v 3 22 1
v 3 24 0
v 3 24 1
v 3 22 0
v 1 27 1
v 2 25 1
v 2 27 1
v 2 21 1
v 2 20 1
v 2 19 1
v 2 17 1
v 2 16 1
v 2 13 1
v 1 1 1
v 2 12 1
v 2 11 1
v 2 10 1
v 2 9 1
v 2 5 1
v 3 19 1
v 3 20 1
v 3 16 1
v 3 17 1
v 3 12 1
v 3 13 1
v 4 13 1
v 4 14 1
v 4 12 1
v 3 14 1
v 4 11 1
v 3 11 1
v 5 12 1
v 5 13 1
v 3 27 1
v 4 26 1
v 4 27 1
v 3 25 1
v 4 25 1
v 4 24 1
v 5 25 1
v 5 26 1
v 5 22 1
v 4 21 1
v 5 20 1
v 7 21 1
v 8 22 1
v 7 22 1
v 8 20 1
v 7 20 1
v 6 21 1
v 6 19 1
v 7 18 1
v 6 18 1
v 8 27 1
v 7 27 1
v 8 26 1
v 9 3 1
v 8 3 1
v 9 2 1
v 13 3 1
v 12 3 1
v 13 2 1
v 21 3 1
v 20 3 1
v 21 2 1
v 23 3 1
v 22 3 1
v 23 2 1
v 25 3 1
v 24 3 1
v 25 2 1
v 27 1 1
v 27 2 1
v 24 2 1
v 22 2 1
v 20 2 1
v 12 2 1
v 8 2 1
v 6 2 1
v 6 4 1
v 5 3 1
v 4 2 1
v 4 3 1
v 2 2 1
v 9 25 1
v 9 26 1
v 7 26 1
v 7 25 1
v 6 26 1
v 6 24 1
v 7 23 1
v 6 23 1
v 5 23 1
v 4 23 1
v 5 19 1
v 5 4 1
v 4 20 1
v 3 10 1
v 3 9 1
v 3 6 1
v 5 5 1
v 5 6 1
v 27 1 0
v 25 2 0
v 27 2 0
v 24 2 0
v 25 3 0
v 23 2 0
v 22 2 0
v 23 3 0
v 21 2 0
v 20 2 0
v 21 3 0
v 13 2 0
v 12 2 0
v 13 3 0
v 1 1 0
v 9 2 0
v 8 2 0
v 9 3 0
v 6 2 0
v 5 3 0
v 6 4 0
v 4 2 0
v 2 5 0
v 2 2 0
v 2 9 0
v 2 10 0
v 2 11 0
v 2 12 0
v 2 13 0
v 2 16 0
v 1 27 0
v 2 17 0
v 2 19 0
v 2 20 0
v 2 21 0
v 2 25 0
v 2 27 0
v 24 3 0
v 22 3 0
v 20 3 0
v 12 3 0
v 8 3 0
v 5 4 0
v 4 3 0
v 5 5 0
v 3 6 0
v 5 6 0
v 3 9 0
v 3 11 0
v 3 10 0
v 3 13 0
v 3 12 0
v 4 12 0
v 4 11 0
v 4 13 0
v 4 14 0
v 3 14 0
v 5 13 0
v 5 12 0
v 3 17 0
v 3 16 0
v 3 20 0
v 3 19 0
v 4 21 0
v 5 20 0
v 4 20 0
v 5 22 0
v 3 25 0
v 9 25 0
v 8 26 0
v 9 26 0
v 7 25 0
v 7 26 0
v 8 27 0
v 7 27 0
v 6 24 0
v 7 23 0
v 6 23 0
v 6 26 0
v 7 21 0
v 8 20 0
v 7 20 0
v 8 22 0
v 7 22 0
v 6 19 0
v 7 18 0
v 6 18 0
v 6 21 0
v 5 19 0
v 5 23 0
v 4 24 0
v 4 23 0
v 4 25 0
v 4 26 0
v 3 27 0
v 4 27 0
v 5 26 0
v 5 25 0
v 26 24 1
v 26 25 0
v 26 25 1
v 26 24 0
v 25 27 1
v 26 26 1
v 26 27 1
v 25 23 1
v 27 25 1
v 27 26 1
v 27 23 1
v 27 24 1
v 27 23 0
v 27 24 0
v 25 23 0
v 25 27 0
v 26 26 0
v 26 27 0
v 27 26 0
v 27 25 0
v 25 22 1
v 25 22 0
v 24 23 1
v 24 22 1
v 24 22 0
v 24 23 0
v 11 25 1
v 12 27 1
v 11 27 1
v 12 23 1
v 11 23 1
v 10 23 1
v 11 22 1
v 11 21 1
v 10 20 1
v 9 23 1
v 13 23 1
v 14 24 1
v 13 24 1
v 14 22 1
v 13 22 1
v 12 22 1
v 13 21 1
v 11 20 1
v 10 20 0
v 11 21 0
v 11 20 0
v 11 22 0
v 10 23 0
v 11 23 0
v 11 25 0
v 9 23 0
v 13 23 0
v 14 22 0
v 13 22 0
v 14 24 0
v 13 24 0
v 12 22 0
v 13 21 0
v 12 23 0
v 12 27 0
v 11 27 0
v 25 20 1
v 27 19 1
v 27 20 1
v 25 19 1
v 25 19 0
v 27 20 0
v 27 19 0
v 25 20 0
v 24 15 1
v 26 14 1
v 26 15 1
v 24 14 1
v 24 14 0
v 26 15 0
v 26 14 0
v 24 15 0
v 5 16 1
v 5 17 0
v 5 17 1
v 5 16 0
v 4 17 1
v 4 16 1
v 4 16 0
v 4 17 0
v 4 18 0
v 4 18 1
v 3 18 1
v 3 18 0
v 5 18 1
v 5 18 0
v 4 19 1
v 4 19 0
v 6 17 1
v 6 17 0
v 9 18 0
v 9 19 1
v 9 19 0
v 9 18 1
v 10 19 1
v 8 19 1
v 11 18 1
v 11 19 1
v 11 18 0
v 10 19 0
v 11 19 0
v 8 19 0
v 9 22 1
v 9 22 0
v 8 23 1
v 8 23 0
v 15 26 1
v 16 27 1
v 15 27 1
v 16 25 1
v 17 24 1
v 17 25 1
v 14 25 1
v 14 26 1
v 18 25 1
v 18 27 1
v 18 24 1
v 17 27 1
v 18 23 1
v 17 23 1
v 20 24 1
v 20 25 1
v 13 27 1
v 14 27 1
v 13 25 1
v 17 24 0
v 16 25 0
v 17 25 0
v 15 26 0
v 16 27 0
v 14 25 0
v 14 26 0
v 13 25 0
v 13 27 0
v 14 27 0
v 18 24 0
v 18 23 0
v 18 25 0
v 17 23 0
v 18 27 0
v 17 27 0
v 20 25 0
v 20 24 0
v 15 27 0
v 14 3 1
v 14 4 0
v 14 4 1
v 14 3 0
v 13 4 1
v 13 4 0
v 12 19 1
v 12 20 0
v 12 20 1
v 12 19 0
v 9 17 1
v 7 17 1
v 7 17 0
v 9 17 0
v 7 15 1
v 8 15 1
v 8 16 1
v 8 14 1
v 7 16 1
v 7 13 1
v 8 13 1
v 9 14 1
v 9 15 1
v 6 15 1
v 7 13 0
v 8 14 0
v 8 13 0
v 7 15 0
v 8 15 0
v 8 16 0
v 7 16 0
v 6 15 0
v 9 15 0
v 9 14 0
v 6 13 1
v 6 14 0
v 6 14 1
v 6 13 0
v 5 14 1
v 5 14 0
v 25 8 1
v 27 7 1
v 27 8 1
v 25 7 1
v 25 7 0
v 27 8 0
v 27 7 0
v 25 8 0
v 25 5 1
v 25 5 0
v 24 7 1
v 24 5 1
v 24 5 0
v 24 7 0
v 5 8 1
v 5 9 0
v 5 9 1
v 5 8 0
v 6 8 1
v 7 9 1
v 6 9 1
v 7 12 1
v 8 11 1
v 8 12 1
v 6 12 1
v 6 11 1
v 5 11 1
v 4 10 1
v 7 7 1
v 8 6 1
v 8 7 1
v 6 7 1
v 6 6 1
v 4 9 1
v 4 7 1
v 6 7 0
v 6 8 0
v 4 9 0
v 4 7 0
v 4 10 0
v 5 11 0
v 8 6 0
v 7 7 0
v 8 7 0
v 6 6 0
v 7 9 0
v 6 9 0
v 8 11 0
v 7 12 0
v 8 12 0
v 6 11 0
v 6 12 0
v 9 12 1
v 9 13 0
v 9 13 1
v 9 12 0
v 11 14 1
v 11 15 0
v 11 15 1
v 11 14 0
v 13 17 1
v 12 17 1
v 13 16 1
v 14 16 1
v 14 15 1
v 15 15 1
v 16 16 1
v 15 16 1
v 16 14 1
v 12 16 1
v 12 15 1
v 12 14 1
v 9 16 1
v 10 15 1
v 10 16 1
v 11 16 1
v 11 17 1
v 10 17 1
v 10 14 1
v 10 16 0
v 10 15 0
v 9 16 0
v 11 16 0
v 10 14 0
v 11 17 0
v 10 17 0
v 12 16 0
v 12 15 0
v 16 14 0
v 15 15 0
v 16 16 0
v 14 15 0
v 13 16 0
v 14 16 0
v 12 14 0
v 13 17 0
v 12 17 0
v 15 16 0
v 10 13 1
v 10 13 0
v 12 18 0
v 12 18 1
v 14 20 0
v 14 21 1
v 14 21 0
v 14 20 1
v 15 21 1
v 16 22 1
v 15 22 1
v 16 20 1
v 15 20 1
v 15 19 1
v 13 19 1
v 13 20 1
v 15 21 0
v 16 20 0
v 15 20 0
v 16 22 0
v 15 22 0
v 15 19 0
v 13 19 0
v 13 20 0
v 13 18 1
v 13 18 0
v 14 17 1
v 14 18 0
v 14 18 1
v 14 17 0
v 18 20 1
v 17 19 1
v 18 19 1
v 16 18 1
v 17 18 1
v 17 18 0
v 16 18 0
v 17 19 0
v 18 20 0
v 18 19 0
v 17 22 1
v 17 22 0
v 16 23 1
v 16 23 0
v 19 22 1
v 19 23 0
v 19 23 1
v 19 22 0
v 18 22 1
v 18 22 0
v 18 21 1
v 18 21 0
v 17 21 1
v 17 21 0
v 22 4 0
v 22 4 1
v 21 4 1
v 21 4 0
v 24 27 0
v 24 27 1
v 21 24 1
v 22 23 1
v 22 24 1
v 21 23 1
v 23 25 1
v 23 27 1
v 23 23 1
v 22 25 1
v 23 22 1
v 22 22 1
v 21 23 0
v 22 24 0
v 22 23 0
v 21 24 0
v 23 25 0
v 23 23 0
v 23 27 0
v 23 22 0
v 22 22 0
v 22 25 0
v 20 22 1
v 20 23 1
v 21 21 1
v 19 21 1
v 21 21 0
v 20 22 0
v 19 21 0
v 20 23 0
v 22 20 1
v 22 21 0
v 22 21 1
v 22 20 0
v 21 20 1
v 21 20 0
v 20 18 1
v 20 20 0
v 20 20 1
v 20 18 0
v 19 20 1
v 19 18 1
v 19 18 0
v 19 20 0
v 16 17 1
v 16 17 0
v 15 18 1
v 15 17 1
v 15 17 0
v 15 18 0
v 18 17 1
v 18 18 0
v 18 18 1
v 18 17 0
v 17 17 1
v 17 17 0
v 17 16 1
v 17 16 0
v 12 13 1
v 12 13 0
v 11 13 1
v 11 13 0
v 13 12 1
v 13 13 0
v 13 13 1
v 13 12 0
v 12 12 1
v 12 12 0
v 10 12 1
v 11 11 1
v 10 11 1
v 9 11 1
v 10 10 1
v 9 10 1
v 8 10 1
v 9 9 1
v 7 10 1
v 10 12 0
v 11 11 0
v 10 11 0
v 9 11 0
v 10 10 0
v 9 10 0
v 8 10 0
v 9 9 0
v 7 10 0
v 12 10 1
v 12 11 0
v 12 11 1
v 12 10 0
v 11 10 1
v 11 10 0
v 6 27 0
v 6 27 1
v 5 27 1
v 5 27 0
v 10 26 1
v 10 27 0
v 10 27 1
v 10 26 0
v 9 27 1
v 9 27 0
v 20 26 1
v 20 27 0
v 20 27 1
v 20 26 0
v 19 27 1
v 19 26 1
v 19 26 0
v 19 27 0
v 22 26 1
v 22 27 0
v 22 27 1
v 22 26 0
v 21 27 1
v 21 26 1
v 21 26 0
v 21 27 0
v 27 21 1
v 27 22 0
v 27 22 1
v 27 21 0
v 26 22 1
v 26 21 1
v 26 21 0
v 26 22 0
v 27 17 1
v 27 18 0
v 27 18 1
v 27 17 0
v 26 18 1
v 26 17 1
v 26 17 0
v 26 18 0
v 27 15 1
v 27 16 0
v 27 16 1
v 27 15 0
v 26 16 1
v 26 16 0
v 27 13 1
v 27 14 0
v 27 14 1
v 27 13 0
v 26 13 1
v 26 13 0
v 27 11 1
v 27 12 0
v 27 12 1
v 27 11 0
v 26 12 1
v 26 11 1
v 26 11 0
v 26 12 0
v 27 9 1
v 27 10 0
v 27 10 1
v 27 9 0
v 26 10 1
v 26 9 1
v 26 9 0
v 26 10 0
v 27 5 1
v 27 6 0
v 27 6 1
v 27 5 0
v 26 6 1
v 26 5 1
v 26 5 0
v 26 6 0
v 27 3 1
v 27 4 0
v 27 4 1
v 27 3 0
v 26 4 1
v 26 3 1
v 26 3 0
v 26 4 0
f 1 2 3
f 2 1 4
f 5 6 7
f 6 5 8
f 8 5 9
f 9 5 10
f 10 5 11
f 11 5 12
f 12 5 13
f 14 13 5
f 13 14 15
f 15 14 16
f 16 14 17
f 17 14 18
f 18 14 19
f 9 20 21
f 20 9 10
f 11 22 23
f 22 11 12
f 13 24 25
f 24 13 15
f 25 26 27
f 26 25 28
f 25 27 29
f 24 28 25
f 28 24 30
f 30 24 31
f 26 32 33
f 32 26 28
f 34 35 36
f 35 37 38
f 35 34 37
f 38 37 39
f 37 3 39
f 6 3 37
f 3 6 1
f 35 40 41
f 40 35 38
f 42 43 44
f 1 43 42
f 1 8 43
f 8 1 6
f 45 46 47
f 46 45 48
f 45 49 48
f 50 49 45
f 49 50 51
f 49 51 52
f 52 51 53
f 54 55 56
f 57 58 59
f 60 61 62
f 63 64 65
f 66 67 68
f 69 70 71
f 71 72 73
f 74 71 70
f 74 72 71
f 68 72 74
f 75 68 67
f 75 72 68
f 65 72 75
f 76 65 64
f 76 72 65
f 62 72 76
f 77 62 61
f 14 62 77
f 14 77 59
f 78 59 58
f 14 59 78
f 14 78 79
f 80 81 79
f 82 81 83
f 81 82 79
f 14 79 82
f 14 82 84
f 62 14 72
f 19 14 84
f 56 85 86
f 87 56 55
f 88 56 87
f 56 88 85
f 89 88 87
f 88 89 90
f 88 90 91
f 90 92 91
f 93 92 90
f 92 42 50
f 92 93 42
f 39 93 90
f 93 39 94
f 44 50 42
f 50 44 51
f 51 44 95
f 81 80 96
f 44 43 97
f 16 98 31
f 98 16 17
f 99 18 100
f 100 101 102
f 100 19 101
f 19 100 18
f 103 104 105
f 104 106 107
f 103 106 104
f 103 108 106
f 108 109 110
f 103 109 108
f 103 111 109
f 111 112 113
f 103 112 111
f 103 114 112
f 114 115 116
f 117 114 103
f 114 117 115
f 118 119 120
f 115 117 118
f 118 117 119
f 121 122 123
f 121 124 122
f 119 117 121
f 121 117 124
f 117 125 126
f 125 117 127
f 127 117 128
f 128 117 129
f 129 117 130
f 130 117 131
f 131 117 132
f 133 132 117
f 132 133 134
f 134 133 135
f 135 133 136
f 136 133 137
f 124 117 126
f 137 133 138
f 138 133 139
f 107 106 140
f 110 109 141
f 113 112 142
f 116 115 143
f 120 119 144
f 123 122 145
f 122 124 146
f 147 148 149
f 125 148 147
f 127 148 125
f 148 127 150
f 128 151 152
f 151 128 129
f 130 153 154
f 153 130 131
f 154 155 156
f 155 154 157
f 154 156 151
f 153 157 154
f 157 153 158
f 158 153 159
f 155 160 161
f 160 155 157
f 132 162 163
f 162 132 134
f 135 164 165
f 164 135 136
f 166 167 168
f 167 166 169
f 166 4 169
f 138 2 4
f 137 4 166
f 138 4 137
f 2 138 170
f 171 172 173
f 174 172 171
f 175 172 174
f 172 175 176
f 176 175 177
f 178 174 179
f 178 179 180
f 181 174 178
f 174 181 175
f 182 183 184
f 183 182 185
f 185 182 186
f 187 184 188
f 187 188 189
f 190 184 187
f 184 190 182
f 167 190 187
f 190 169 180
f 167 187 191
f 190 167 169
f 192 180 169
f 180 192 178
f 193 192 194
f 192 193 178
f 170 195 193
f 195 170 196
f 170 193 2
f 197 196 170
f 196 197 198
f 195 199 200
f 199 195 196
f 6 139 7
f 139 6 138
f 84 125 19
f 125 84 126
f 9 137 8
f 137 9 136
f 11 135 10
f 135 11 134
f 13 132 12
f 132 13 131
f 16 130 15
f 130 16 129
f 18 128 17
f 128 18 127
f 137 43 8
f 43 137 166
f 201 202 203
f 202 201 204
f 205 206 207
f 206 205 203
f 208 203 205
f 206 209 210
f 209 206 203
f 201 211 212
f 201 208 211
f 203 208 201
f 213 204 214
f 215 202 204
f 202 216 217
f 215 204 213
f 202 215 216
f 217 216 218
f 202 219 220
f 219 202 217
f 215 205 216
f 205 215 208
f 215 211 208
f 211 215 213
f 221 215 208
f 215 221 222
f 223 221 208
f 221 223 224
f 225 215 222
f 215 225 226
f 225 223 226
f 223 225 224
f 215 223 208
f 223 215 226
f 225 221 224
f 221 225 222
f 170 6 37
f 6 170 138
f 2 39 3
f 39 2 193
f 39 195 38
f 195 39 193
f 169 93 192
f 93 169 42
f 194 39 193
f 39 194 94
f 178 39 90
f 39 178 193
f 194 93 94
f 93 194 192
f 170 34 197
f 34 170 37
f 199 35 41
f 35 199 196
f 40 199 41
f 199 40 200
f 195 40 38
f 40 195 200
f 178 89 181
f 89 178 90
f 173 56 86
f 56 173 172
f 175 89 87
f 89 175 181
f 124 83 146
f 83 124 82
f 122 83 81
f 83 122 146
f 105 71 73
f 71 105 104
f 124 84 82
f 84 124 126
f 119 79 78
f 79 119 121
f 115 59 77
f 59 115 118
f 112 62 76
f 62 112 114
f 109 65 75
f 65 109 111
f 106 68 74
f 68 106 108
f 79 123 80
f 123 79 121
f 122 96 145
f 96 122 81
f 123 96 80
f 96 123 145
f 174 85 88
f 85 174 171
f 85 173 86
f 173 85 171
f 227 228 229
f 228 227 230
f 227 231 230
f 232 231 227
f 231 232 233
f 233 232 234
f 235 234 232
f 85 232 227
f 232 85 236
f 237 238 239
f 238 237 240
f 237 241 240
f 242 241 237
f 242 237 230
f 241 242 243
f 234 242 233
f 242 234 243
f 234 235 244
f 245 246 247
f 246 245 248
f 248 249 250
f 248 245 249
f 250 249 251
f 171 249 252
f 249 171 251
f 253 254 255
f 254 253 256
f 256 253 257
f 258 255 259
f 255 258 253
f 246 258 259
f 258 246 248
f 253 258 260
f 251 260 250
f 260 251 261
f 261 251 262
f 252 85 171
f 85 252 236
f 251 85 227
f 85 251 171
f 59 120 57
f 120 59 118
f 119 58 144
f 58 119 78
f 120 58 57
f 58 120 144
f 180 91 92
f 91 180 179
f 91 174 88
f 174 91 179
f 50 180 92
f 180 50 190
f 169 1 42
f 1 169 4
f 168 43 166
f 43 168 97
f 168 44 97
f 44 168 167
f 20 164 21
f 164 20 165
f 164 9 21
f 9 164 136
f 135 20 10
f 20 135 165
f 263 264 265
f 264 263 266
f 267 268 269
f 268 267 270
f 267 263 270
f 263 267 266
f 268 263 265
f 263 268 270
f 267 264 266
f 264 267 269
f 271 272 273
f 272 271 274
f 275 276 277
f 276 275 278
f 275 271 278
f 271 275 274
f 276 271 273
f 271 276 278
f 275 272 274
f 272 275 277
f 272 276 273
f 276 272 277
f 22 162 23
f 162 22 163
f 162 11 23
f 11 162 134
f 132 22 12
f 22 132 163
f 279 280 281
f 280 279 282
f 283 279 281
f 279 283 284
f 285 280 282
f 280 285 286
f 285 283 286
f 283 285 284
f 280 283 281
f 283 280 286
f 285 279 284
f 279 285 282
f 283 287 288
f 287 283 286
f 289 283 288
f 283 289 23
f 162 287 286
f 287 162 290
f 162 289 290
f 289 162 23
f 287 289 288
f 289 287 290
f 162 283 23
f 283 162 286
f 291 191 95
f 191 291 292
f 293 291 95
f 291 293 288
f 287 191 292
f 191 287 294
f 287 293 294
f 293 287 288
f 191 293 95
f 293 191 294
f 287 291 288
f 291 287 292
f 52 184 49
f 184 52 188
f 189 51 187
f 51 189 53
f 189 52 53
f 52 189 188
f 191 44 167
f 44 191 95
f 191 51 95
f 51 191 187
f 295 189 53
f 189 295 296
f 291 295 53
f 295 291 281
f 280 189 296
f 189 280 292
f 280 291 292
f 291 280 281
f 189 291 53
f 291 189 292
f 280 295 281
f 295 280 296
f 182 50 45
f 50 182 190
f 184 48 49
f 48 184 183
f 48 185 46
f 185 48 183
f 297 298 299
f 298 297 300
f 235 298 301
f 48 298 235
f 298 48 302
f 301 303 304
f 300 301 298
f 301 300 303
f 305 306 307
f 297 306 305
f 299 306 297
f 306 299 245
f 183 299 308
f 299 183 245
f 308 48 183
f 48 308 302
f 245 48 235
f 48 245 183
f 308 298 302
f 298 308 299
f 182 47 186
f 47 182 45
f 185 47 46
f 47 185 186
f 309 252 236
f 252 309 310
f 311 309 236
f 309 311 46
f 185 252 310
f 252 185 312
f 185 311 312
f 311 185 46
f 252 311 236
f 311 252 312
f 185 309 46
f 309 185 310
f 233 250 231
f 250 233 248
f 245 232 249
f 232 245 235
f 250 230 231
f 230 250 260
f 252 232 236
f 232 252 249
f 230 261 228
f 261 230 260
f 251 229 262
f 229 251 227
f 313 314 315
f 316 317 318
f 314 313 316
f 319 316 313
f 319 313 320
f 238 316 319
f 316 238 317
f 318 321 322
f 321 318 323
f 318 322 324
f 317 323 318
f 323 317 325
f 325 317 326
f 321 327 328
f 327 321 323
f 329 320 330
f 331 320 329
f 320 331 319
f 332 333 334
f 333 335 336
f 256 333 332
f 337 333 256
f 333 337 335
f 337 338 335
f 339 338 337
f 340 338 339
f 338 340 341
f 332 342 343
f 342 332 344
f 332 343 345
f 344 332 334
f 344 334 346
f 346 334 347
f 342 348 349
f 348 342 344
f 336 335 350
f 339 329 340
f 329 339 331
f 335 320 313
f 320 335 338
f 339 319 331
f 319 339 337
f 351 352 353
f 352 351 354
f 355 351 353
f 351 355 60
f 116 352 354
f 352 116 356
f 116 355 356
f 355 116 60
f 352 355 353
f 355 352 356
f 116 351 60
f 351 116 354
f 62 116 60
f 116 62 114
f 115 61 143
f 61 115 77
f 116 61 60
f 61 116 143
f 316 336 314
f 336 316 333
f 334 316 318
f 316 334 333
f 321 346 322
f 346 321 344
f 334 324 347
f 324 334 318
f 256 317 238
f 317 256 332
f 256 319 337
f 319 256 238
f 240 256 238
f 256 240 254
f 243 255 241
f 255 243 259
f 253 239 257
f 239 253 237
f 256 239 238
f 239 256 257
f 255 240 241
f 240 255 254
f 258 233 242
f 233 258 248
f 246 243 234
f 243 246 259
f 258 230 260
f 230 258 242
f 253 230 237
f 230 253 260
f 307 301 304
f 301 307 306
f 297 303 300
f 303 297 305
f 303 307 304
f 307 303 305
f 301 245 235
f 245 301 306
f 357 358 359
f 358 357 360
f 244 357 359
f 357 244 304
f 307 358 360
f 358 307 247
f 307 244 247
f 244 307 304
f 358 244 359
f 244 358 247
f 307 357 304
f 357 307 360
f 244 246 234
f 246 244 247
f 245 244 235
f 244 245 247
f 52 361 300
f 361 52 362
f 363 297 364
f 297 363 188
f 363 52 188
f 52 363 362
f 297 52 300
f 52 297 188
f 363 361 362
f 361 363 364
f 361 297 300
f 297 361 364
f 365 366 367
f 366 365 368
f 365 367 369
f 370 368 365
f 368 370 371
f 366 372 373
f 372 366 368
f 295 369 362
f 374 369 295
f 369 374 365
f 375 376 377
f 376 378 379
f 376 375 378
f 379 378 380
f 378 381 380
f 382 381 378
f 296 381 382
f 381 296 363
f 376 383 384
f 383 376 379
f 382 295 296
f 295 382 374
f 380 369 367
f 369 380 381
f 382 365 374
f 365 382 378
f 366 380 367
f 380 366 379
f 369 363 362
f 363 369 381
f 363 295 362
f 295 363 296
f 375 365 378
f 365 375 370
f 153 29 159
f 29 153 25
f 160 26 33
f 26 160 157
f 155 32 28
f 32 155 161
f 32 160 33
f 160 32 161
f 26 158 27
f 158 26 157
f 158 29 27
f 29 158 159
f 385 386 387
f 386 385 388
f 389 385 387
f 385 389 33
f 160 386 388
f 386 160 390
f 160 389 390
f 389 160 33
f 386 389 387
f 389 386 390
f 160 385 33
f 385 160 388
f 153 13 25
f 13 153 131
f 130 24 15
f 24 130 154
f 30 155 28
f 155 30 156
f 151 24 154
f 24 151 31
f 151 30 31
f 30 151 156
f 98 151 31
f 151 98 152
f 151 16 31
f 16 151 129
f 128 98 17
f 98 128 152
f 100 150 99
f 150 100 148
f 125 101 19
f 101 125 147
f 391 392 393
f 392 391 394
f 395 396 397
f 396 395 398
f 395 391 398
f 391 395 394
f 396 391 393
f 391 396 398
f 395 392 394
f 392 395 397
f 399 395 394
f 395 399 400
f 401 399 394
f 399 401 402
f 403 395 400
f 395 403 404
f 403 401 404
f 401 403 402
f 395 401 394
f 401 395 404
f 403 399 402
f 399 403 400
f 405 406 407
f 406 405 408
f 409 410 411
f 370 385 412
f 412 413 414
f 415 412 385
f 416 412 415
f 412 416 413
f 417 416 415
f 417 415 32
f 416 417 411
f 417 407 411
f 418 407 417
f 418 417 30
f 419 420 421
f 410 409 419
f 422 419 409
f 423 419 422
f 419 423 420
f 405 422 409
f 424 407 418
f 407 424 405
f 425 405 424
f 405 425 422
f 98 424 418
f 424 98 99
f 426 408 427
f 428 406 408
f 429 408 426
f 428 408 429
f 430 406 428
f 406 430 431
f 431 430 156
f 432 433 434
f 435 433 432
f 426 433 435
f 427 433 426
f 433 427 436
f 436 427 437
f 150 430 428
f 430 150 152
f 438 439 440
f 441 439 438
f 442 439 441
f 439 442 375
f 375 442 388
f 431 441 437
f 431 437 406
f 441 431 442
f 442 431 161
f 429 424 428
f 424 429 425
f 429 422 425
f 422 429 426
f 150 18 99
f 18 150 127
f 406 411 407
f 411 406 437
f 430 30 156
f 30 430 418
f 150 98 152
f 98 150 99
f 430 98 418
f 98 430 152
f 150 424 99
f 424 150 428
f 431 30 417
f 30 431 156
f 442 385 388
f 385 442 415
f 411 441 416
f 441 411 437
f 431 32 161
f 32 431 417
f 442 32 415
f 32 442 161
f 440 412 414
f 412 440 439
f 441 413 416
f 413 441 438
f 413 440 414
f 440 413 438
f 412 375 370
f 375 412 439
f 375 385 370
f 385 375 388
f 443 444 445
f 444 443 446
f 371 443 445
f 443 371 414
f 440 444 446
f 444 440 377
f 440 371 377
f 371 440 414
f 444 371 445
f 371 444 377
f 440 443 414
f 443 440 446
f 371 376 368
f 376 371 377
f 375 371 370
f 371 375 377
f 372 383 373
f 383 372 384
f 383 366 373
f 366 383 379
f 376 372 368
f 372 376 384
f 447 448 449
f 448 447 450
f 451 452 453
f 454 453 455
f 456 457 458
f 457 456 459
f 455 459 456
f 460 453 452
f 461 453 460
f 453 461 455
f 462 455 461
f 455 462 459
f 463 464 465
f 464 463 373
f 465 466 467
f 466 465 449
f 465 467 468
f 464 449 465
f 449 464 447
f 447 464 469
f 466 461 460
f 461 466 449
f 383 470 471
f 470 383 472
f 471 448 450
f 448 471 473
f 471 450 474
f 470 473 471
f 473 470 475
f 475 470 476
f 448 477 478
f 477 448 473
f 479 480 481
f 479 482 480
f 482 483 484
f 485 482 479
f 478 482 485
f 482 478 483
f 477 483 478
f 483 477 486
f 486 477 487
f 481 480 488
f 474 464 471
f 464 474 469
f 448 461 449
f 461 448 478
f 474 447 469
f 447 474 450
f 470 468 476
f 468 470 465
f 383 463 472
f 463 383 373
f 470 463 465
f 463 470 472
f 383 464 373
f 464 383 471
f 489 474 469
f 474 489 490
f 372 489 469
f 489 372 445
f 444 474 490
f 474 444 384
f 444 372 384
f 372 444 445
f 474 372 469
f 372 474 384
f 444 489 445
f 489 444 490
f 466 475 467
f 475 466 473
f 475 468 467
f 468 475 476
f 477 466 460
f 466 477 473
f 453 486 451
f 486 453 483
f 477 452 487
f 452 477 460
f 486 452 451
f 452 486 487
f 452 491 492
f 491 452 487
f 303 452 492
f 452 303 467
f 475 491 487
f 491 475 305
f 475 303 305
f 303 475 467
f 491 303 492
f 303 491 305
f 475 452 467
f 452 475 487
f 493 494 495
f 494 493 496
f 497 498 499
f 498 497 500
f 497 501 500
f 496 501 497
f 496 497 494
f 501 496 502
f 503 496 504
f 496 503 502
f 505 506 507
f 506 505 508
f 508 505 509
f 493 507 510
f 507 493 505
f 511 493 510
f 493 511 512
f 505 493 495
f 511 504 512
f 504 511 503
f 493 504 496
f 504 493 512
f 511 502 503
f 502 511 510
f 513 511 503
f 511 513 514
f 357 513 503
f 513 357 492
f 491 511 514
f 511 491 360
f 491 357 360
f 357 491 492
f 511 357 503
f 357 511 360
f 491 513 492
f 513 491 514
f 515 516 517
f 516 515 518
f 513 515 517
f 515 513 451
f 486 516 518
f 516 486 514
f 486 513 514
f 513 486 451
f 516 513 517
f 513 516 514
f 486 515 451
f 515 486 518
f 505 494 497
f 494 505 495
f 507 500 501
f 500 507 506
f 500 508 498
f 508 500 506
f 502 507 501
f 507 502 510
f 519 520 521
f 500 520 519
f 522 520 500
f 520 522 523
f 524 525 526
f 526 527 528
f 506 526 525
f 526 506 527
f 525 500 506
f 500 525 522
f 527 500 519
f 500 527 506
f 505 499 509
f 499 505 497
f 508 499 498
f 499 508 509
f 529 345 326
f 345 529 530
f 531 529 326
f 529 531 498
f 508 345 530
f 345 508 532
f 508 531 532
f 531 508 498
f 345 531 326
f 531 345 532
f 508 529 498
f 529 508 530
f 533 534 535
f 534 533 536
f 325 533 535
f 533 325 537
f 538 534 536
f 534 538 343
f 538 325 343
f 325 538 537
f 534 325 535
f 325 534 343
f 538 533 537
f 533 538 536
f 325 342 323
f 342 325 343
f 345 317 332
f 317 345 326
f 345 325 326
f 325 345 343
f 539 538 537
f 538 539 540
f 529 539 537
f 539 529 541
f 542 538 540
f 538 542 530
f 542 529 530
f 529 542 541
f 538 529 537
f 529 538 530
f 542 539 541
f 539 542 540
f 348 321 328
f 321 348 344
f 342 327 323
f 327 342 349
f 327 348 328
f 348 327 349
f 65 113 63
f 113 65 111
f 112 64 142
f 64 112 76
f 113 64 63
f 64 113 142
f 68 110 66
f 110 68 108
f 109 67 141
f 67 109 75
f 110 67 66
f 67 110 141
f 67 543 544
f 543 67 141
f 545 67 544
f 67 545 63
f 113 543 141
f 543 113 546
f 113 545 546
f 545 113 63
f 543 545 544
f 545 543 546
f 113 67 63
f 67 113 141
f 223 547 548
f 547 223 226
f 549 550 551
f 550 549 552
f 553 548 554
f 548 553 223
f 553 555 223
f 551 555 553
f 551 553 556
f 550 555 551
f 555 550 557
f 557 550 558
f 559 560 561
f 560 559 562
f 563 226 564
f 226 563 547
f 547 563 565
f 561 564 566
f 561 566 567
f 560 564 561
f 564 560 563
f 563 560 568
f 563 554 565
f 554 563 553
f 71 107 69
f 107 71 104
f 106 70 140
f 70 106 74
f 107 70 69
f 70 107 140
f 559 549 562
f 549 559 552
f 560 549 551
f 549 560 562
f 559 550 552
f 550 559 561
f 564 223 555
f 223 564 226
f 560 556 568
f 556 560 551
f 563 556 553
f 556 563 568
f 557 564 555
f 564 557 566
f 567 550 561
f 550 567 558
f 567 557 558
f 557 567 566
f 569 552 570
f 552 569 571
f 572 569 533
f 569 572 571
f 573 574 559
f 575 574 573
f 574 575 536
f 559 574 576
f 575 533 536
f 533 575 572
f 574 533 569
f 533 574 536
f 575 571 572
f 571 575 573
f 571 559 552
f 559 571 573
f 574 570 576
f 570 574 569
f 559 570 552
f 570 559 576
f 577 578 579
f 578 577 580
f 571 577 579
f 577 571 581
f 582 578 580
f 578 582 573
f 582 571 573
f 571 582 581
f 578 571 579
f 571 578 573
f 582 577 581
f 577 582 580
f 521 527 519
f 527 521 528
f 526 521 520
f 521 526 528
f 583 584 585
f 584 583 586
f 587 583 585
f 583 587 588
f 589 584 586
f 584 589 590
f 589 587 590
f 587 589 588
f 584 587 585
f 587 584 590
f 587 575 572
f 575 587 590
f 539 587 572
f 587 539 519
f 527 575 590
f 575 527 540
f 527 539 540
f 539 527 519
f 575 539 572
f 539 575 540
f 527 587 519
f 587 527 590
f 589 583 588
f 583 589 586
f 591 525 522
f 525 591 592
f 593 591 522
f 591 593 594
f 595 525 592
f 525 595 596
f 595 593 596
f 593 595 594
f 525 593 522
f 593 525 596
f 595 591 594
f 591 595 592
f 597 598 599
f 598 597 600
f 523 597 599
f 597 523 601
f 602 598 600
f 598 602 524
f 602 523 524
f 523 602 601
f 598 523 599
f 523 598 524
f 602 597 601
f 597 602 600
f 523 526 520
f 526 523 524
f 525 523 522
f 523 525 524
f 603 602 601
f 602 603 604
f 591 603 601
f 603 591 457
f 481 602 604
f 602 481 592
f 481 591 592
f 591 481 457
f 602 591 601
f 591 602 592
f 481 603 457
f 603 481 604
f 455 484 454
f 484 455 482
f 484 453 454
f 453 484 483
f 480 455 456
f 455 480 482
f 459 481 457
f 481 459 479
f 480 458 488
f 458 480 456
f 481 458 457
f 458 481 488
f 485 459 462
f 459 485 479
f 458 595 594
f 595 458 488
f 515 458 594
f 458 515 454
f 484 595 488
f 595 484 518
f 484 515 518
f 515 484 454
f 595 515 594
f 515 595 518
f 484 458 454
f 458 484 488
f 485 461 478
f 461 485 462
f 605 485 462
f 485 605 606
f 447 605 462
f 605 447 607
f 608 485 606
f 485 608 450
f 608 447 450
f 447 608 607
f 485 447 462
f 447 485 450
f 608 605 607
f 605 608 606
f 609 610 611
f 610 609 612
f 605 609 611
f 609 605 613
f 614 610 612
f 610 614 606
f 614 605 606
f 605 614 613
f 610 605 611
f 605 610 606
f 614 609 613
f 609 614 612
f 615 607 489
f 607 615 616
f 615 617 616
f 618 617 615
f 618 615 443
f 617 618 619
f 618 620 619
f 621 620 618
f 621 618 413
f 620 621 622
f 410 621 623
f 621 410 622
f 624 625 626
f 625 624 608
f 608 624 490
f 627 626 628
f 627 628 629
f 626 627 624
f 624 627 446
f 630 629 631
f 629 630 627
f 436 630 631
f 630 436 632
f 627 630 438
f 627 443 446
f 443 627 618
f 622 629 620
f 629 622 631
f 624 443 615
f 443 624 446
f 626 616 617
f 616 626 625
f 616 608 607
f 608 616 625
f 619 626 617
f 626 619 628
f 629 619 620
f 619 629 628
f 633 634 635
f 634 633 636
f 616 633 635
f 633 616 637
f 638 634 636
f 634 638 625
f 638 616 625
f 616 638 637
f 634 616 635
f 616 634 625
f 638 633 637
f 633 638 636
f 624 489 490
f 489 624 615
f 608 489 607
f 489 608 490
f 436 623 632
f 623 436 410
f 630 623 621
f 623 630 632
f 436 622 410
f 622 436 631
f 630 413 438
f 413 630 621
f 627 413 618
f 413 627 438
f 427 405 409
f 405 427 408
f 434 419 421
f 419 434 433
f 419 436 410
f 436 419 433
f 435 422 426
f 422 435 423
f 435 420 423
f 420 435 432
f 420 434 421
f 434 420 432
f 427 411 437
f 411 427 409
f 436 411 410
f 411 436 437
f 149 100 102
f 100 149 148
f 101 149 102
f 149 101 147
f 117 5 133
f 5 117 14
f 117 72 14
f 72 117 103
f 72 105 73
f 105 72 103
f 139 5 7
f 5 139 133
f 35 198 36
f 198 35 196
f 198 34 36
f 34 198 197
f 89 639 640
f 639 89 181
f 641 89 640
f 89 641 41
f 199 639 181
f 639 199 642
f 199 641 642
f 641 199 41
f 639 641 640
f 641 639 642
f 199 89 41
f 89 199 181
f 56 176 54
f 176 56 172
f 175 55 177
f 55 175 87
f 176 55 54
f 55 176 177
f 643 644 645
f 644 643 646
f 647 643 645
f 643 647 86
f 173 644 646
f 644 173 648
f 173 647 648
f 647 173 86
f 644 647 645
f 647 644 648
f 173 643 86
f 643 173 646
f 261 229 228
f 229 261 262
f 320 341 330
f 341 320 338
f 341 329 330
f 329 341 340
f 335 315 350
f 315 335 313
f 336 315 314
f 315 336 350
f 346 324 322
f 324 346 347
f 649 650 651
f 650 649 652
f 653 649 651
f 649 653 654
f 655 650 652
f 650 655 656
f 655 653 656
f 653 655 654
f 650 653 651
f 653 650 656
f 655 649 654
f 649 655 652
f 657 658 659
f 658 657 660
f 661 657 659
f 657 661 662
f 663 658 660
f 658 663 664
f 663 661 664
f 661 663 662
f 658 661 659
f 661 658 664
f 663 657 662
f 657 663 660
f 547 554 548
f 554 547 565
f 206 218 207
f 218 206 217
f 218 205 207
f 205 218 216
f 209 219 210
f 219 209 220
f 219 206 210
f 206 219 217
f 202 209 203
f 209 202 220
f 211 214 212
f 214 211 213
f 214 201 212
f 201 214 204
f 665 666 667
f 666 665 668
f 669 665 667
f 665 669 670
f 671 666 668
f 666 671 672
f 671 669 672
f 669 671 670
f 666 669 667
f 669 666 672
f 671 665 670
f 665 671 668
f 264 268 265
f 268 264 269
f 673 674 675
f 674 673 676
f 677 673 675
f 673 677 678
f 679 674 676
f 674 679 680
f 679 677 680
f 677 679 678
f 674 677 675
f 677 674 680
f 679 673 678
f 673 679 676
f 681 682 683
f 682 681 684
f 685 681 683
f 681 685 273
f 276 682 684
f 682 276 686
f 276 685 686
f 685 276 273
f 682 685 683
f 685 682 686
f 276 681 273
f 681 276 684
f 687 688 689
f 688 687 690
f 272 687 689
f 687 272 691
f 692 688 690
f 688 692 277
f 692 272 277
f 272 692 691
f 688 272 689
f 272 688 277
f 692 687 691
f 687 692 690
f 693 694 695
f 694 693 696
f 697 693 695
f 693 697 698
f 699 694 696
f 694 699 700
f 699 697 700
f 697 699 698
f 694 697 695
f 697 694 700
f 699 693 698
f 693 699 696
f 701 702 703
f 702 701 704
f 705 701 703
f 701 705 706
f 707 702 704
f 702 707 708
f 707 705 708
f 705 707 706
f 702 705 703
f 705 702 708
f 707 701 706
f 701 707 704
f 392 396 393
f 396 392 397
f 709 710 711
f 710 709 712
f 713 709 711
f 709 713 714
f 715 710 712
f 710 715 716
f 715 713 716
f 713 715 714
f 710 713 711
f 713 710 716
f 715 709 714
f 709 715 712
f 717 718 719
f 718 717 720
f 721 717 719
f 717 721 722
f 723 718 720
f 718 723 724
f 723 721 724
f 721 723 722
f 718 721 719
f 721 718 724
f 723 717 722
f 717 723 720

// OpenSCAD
// file: util/bitmap.scad
/*****************************************************************************
 * Module Bitmap Library
 * Modules to create bitmaps of unit squares from 1 or 2 dimensional vectors.
 *****************************************************************************
 * Copyright 2017 Chris Baker
 *
 * This program is free software: you can redistribute it and/or modify
 * it under the terms of the GNU Lesser General Public License as published by
 * the Free Software Foundation, either version 3 of the License, or
 * (at your option) any later version.
 *
 * This program is distributed in the hope that it will be useful,
 * but WITHOUT ANY WARRANTY; without even the implied warranty of
 * MERCHANTABILITY or FITNESS FOR A PARTICULAR PURPOSE.  See the
 * GNU Lesser General Public License for more details.
 *
 * You should have received a copy of the GNU Lesser General Public License
 * along with this program.  If not, see <http://www.gnu.org/licenses/>.
 *****************************************************************************
 * Usage:
 * Include this file with the "use" tag.
 * Depends on compat.scad library.
 *
 * API:
 *   1dbitmap(bitmap, center, expansion, vector_mode)
 *   2dbitmap(bitmap, center, expansion, vector_mode)
 *     Generate a 1 or 2-Dimensional field of modules based on the provided
 *     bitmap vector. See Bitmap Vectors below.
 *     The center flag determines whether to center the bitmap on the origin.
 *     The expansion value actually shrinks each cube in the x and y
 *     dimension by the specified amount.
 *     The vector_mode flag determines whether to create 3D solid geometry
 *     (unit cubes) or 2D vector geometry (squares).
 *
 * Bitmap Vectors:
 *   The bitmap vectors primarily provide boolean information.
 *   A module will be placed where these vectors have a postive value and
 *   skipped where they have a negative value. I.E. 0, -1, false, and undef
 *   are all equivalent and result in a skip. 1 and true are equivalent and
 *   result in a placed 1-unit module.
 *   Further, if the value is an integer it will be treated as a height for
 *   the module, allowing z-maps to be created.
 *   If the value is not an integer or boolean, it will be treated as a color
 *   reference. This can be a string or RGBA vector that will be used to
 *   color the module in the OpenSCAD preview window.
 *   In current versions of OpenSCAD, the color has no effect in the rendered
 *   view or STL output.
 *
 * Vector Mode:
 *   Although OpenSCAD supports generating 2D geometry, there are several
 *   caveats:
 *   - 2D and 3D geometry cannot be mixed
 *   - Extruding 2D geometry causes color information to be lost
 *   - All 2D geometry is projected onto the XY plane when rendering
 *   - Rendering also results in loss of color (same as 3D)
 *   - The SVG exporter is somewhat limited:
 *     - The pixel size of the image is hard-coded in the file
 *     - The title of the image is a generic string
 *     - The color selection for stroke and fill is fixed
 *     - The stroke-width is set to a large value that will cause overlap
 *     - The background is transparent
 *     - Only one path element is created with all of the geometry; there is
 *       no easy way to split up the geometry into multiple logical units.
 *     - These issues can mostly be resolved by hand-editing the file:
 *       - Remove or modify the width and height parameters from the svg
 *         element at the top of the file to provide better scaling.
 *       - Edit the title element at the top of the file to change the title.
 *       - Edit the stroke and fill parameters of the path element (these will
 *         probably be at the end of the file).
 *       - Set the stroke-width parameter for the path element to 0.
 *****************************************************************************/
use <compat.scad>

/*
 * 2dbitmap - Turn a 2D vector into a bitmap of cubes
 *
 * bitmap - 2D vector representing where to place each cube
 *          Value can either be boolean, z-height, or color
 * center - center cubes around the origin
 * expansion - size of gap around each pixel (screendoor)
 * vector_mode - create a 2D vector drawing instead of 3D extrusion
 */
module 2dbitmap(bitmap=[[1,0],[0,1]], center=false, expansion=0, vector_mode=false)
{
	ylen=len(bitmap)-1;

	for (y=[0:ylen]) {
		xlen=len(bitmap[y])-1;
		for (x=[0:xlen])
			translate([x-(center?xlen/2:0),ylen-y-(center?ylen/2:0),0])
				if (is_indexable(bitmap[y][x]))
					color(bitmap[y][x])
						if (vector_mode)
							square([1-expansion,1-expansion], center=center);
						else
							cube([1-expansion,1-expansion,1], center=center);
				else
					if (bitmap[y][x])
						if (vector_mode)
							square([1-expansion,1-expansion], center=center);
						else
							cube([1-expansion,1-expansion,clamp_nonnum(bitmap[y][x])], center=center);
	}
}

module 1dbitmap(bitmap=[1,0,1,0,1], center=false, expansion=0, vector_mode=false)
	2dbitmap([bitmap], center, expansion, vector_mode);

/*
 * Examples
 */

// 1D with z-height
translate([10,0,0]) scale([1,10,1])
	1dbitmap(bitmap=[1,1,0,2,0,0,3], expansion=.1);

// 1D with boolean
translate([-20,0,0]) scale([1,10,1])
	1dbitmap(bitmap=[true,false,true,false,true,true]);

// 2D with z-height
scale([2,2,1])
	2dbitmap(bitmap=[[1,0,2,1],[0,3,3,0],[1,1,0,1]],
		center=true);

// 1D with color
translate([0,-10,0]) scale([1,3,1])
	1dbitmap(bitmap=["red","white","blue",[0,0.3,0,0.5]]);

// 1D with color using 2D-vector-mode
translate([-7,-8,0]) scale([1,2])
	1dbitmap(bitmap=["red",0,"blue",0,"green"], vector_mode=true);
translate([-4.5,-10,0]) scale([1,2])
	1dbitmap(bitmap=["red",0,"blue",0,"green"], vector_mode=true, center=true);
// file: util/bitlib.scad
/*****************************************************************************
 * Bit Manipulation Library
 * Provides some useful bit manipulation functions.
 *****************************************************************************
 * Copyright 2017 Chris Baker
 *
 * This program is free software: you can redistribute it and/or modify
 * it under the terms of the GNU Lesser General Public License as published by
 * the Free Software Foundation, either version 3 of the License, or
 * (at your option) any later version.
 *
 * This program is distributed in the hope that it will be useful,
 * but WITHOUT ANY WARRANTY; without even the implied warranty of
 * MERCHANTABILITY or FITNESS FOR A PARTICULAR PURPOSE.  See the
 * GNU Lesser General Public License for more details.
 *
 * You should have received a copy of the GNU Lesser General Public License
 * along with this program.  If not, see <http://www.gnu.org/licenses/>.
 *****************************************************************************
 * Usage:
 * Include this file with the "use" tag.
 * When run on its own, all echo statements in this
 * library should print "true".
 *
 * API:
 *   bit(v,b)
 *     Return the truth value of the b'th bit of v.
 *
 *   check_bit_size(v,b,signed=false)
 *     Determine whether the value v can be represented
 *     with b bits (b must be positive).
 *     The signed flag indicates whether to include the
 *     sign bit in the determination; otherwise negative
 *     values will result in undef being returned.
 *
 *   xor(a,b)
 *     Return the value of a xor b.
 *     Handles arbitrary size values for a and b.
 *     Handles negative values as expected (a positive
 *     result will be returned unless a and b have
 *     differing signs).
 *
 * TODO:
 *  - Change echos to asserts (future OpenSCAD version)
 *  - Add more functions
 *
 *****************************************************************************/

//Return the truth value of the b'th bit of v
function bit(v,b) =
	((v==undef)||(b==undef)||(b<0))?undef:
	(floor(v / pow(2, b)) % 2)?true:false;

echo("*** bit() testcases ***");
echo(0,bit(0,0)==false);
echo(1,bit(-1,0)==true);
echo(2,bit(1,0)==true);
echo(3,[for (i=[0:63]) bit(0,i)]==[for (i=[0:63]) false]); //0=0...0
echo(4,[for (i=[0:63]) bit(-1,i)]==[for (i=[0:63]) true]); //-1=1...1
echo(5,[for (i=[1:63]) bit(1,i)]==[for (i=[1:63]) false]); //1=0...01
echo(6,[for (i=[0:7]) bit(85,i)?1:0]==[1,0,1,0,1,0,1,0]); //85=01010101
echo(7,[for (i=[0:7]) bit(170,i)?1:0]==[0,1,0,1,0,1,0,1]); //170=10101010
echo(8,[for (i=[0:7]) bit(165,i)?1:0]==[1,0,1,0,0,1,0,1]); //165=10100101
echo(9,[for (i=[0:7]) bit(56,i)?1:0]==[0,0,0,1,1,1,0,0]); //56=00111000
echo(10,[for (i=[0:7]) bit(-3,i)?1:0]==[1,0,1,1,1,1,1,1]); //-3=1...101
//(2^64)=0...01 0...0
echo(11,bit(pow(2,64),64)==true);
echo(12,[for (i=[0:63]) bit(pow(2,64),i)]==[for (i=[0:63]) false]);
echo(13,[for (i=[65:127]) bit(pow(2,64),i)]==[for (i=[1:63]) false]);
//-(2^64)=1...1 0...0
echo(14,[for (i=[0:63]) bit(-pow(2,64),i)]==[for (i=[0:63]) false]);
echo(15,[for (i=[64:127]) bit(-pow(2,64),i)]==[for (i=[0:63]) true]);
echo(16,bit(10,-1)==undef);
echo(17,bit(10,undef)==undef);
echo(18,bit(undef,3)==undef);

//return true if v can be represented in b bits
//if signed flag is set. the result will be adjusted
//to account for the needed sign bit
function check_bit_size(v,b,signed=false) =
	(b<0)?undef:
	(v==undef)?undef:
	(b==0)?false:
	(v==0)?true: //(b>0)
	(signed)?
		(v<0)?(-pow(2,b-1)<(v+1)):
			(pow(2,b-1)>(v+1)):
		(v<0)?undef:
			(pow(2,b)>v);

echo("*** check_bit_size() testcases ***");
echo(0,check_bit_size(-1,2)==undef);
echo(1,check_bit_size(2,-4)==undef);
echo(2,check_bit_size(2,-4,signed=true)==undef);
echo(3,check_bit_size(0,0)==false);
echo(4,check_bit_size(0,1)==true);
echo(5,check_bit_size(1,0)==false);
echo(6,check_bit_size(1,1)==true);
echo(7,check_bit_size(7,3)==true);
echo(8,check_bit_size(8,3)==false);
echo(9,check_bit_size(1,3)==true);
echo(10,check_bit_size(256,8)==false);
echo(11,check_bit_size(255,8)==true);
echo(12,check_bit_size(10,2)==false);
echo(13,check_bit_size(10,4)==true);
echo(14,check_bit_size(-10,2,signed=true)==false);
echo(15,check_bit_size(-10,4,signed=true)==false);
echo(16,check_bit_size(-10,5,signed=true)==true);
echo(17,check_bit_size(-1,0,signed=true)==false);
echo(18,check_bit_size(-1,1,signed=true)==true);
echo(19,check_bit_size(0,0,signed=true)==false);
echo(20,check_bit_size(0,1,signed=true)==true);
echo(21,check_bit_size(-2,2,signed=true)==true);
echo(22,check_bit_size(-3,2,signed=true)==false);
echo(23,check_bit_size(-3,3,signed=true)==true);
echo(24,check_bit_size(-8,3,signed=true)==false);
echo(25,check_bit_size(-8,4,signed=true)==true);
echo(26,check_bit_size(undef,4)==undef);
echo(27,check_bit_size(undef,4,signed=true)==undef);

//return the value of a xor b
//runs recursively until all bits of a and b are exhausted
function xor(a,b,i=0) =
	((a==undef)||(b==undef))?undef:
	let (c=bit(a,i), d=bit(b,i),
		 v=((c||d) && !(c&&d))?pow(2,i):0)
		(check_bit_size(a,i,signed=true) &&
		 check_bit_size(b,i,signed=true))?
			-v: //special case for sign bit
			v+xor(a,b,i+1); //recursively add powers of 2

echo("*** xor() testcases ***");
echo(0,xor(42,0)==42);
echo(1,xor(42,42)==0);
echo(2,xor(169,238)==71); //10101001^11101110=01000111=71
echo(3,xor(238,169)==71);
echo(4,xor(42,238)==196); //00101010^11101110=11000100=196
echo(5,xor(169,42)==131); //10101001^00101010=10000011=131
echo(6,xor(-8,-10)==14); //11000^10110=01110=14
echo(7,xor(-7,-10)==15); //11001^10110=01111=15
echo(8,xor(9,-10)==-1); //01001^10110=11111=-1
echo(9,xor(9,-12)==-3); //01001^10100=11101=-3
echo(10,xor(undef,0)==undef);
// main file
/* See API documentation in barcodes/datamatrix.scad for more details. */
use <barcodes/datamatrix.scad>

/* simple example */
//data_matrix(dm_ascii("1234"), mark="black");

/* base-256 mode example */
//data_matrix(dm_base256_append([base256_mode()],[72,101,108,108,111,32,87,111,114,108,100]), mark="black");

/* typical ascii example */
data_matrix(dm_ascii("https://github.com/X-Illuminati/glyphinator/"), mark="black");

/* more compact version */
//data_matrix(concat(text_mode(),dm_text("https://github.com/X-Illuminati/glyphinato"),dm_ascii("r")), mark="black");
